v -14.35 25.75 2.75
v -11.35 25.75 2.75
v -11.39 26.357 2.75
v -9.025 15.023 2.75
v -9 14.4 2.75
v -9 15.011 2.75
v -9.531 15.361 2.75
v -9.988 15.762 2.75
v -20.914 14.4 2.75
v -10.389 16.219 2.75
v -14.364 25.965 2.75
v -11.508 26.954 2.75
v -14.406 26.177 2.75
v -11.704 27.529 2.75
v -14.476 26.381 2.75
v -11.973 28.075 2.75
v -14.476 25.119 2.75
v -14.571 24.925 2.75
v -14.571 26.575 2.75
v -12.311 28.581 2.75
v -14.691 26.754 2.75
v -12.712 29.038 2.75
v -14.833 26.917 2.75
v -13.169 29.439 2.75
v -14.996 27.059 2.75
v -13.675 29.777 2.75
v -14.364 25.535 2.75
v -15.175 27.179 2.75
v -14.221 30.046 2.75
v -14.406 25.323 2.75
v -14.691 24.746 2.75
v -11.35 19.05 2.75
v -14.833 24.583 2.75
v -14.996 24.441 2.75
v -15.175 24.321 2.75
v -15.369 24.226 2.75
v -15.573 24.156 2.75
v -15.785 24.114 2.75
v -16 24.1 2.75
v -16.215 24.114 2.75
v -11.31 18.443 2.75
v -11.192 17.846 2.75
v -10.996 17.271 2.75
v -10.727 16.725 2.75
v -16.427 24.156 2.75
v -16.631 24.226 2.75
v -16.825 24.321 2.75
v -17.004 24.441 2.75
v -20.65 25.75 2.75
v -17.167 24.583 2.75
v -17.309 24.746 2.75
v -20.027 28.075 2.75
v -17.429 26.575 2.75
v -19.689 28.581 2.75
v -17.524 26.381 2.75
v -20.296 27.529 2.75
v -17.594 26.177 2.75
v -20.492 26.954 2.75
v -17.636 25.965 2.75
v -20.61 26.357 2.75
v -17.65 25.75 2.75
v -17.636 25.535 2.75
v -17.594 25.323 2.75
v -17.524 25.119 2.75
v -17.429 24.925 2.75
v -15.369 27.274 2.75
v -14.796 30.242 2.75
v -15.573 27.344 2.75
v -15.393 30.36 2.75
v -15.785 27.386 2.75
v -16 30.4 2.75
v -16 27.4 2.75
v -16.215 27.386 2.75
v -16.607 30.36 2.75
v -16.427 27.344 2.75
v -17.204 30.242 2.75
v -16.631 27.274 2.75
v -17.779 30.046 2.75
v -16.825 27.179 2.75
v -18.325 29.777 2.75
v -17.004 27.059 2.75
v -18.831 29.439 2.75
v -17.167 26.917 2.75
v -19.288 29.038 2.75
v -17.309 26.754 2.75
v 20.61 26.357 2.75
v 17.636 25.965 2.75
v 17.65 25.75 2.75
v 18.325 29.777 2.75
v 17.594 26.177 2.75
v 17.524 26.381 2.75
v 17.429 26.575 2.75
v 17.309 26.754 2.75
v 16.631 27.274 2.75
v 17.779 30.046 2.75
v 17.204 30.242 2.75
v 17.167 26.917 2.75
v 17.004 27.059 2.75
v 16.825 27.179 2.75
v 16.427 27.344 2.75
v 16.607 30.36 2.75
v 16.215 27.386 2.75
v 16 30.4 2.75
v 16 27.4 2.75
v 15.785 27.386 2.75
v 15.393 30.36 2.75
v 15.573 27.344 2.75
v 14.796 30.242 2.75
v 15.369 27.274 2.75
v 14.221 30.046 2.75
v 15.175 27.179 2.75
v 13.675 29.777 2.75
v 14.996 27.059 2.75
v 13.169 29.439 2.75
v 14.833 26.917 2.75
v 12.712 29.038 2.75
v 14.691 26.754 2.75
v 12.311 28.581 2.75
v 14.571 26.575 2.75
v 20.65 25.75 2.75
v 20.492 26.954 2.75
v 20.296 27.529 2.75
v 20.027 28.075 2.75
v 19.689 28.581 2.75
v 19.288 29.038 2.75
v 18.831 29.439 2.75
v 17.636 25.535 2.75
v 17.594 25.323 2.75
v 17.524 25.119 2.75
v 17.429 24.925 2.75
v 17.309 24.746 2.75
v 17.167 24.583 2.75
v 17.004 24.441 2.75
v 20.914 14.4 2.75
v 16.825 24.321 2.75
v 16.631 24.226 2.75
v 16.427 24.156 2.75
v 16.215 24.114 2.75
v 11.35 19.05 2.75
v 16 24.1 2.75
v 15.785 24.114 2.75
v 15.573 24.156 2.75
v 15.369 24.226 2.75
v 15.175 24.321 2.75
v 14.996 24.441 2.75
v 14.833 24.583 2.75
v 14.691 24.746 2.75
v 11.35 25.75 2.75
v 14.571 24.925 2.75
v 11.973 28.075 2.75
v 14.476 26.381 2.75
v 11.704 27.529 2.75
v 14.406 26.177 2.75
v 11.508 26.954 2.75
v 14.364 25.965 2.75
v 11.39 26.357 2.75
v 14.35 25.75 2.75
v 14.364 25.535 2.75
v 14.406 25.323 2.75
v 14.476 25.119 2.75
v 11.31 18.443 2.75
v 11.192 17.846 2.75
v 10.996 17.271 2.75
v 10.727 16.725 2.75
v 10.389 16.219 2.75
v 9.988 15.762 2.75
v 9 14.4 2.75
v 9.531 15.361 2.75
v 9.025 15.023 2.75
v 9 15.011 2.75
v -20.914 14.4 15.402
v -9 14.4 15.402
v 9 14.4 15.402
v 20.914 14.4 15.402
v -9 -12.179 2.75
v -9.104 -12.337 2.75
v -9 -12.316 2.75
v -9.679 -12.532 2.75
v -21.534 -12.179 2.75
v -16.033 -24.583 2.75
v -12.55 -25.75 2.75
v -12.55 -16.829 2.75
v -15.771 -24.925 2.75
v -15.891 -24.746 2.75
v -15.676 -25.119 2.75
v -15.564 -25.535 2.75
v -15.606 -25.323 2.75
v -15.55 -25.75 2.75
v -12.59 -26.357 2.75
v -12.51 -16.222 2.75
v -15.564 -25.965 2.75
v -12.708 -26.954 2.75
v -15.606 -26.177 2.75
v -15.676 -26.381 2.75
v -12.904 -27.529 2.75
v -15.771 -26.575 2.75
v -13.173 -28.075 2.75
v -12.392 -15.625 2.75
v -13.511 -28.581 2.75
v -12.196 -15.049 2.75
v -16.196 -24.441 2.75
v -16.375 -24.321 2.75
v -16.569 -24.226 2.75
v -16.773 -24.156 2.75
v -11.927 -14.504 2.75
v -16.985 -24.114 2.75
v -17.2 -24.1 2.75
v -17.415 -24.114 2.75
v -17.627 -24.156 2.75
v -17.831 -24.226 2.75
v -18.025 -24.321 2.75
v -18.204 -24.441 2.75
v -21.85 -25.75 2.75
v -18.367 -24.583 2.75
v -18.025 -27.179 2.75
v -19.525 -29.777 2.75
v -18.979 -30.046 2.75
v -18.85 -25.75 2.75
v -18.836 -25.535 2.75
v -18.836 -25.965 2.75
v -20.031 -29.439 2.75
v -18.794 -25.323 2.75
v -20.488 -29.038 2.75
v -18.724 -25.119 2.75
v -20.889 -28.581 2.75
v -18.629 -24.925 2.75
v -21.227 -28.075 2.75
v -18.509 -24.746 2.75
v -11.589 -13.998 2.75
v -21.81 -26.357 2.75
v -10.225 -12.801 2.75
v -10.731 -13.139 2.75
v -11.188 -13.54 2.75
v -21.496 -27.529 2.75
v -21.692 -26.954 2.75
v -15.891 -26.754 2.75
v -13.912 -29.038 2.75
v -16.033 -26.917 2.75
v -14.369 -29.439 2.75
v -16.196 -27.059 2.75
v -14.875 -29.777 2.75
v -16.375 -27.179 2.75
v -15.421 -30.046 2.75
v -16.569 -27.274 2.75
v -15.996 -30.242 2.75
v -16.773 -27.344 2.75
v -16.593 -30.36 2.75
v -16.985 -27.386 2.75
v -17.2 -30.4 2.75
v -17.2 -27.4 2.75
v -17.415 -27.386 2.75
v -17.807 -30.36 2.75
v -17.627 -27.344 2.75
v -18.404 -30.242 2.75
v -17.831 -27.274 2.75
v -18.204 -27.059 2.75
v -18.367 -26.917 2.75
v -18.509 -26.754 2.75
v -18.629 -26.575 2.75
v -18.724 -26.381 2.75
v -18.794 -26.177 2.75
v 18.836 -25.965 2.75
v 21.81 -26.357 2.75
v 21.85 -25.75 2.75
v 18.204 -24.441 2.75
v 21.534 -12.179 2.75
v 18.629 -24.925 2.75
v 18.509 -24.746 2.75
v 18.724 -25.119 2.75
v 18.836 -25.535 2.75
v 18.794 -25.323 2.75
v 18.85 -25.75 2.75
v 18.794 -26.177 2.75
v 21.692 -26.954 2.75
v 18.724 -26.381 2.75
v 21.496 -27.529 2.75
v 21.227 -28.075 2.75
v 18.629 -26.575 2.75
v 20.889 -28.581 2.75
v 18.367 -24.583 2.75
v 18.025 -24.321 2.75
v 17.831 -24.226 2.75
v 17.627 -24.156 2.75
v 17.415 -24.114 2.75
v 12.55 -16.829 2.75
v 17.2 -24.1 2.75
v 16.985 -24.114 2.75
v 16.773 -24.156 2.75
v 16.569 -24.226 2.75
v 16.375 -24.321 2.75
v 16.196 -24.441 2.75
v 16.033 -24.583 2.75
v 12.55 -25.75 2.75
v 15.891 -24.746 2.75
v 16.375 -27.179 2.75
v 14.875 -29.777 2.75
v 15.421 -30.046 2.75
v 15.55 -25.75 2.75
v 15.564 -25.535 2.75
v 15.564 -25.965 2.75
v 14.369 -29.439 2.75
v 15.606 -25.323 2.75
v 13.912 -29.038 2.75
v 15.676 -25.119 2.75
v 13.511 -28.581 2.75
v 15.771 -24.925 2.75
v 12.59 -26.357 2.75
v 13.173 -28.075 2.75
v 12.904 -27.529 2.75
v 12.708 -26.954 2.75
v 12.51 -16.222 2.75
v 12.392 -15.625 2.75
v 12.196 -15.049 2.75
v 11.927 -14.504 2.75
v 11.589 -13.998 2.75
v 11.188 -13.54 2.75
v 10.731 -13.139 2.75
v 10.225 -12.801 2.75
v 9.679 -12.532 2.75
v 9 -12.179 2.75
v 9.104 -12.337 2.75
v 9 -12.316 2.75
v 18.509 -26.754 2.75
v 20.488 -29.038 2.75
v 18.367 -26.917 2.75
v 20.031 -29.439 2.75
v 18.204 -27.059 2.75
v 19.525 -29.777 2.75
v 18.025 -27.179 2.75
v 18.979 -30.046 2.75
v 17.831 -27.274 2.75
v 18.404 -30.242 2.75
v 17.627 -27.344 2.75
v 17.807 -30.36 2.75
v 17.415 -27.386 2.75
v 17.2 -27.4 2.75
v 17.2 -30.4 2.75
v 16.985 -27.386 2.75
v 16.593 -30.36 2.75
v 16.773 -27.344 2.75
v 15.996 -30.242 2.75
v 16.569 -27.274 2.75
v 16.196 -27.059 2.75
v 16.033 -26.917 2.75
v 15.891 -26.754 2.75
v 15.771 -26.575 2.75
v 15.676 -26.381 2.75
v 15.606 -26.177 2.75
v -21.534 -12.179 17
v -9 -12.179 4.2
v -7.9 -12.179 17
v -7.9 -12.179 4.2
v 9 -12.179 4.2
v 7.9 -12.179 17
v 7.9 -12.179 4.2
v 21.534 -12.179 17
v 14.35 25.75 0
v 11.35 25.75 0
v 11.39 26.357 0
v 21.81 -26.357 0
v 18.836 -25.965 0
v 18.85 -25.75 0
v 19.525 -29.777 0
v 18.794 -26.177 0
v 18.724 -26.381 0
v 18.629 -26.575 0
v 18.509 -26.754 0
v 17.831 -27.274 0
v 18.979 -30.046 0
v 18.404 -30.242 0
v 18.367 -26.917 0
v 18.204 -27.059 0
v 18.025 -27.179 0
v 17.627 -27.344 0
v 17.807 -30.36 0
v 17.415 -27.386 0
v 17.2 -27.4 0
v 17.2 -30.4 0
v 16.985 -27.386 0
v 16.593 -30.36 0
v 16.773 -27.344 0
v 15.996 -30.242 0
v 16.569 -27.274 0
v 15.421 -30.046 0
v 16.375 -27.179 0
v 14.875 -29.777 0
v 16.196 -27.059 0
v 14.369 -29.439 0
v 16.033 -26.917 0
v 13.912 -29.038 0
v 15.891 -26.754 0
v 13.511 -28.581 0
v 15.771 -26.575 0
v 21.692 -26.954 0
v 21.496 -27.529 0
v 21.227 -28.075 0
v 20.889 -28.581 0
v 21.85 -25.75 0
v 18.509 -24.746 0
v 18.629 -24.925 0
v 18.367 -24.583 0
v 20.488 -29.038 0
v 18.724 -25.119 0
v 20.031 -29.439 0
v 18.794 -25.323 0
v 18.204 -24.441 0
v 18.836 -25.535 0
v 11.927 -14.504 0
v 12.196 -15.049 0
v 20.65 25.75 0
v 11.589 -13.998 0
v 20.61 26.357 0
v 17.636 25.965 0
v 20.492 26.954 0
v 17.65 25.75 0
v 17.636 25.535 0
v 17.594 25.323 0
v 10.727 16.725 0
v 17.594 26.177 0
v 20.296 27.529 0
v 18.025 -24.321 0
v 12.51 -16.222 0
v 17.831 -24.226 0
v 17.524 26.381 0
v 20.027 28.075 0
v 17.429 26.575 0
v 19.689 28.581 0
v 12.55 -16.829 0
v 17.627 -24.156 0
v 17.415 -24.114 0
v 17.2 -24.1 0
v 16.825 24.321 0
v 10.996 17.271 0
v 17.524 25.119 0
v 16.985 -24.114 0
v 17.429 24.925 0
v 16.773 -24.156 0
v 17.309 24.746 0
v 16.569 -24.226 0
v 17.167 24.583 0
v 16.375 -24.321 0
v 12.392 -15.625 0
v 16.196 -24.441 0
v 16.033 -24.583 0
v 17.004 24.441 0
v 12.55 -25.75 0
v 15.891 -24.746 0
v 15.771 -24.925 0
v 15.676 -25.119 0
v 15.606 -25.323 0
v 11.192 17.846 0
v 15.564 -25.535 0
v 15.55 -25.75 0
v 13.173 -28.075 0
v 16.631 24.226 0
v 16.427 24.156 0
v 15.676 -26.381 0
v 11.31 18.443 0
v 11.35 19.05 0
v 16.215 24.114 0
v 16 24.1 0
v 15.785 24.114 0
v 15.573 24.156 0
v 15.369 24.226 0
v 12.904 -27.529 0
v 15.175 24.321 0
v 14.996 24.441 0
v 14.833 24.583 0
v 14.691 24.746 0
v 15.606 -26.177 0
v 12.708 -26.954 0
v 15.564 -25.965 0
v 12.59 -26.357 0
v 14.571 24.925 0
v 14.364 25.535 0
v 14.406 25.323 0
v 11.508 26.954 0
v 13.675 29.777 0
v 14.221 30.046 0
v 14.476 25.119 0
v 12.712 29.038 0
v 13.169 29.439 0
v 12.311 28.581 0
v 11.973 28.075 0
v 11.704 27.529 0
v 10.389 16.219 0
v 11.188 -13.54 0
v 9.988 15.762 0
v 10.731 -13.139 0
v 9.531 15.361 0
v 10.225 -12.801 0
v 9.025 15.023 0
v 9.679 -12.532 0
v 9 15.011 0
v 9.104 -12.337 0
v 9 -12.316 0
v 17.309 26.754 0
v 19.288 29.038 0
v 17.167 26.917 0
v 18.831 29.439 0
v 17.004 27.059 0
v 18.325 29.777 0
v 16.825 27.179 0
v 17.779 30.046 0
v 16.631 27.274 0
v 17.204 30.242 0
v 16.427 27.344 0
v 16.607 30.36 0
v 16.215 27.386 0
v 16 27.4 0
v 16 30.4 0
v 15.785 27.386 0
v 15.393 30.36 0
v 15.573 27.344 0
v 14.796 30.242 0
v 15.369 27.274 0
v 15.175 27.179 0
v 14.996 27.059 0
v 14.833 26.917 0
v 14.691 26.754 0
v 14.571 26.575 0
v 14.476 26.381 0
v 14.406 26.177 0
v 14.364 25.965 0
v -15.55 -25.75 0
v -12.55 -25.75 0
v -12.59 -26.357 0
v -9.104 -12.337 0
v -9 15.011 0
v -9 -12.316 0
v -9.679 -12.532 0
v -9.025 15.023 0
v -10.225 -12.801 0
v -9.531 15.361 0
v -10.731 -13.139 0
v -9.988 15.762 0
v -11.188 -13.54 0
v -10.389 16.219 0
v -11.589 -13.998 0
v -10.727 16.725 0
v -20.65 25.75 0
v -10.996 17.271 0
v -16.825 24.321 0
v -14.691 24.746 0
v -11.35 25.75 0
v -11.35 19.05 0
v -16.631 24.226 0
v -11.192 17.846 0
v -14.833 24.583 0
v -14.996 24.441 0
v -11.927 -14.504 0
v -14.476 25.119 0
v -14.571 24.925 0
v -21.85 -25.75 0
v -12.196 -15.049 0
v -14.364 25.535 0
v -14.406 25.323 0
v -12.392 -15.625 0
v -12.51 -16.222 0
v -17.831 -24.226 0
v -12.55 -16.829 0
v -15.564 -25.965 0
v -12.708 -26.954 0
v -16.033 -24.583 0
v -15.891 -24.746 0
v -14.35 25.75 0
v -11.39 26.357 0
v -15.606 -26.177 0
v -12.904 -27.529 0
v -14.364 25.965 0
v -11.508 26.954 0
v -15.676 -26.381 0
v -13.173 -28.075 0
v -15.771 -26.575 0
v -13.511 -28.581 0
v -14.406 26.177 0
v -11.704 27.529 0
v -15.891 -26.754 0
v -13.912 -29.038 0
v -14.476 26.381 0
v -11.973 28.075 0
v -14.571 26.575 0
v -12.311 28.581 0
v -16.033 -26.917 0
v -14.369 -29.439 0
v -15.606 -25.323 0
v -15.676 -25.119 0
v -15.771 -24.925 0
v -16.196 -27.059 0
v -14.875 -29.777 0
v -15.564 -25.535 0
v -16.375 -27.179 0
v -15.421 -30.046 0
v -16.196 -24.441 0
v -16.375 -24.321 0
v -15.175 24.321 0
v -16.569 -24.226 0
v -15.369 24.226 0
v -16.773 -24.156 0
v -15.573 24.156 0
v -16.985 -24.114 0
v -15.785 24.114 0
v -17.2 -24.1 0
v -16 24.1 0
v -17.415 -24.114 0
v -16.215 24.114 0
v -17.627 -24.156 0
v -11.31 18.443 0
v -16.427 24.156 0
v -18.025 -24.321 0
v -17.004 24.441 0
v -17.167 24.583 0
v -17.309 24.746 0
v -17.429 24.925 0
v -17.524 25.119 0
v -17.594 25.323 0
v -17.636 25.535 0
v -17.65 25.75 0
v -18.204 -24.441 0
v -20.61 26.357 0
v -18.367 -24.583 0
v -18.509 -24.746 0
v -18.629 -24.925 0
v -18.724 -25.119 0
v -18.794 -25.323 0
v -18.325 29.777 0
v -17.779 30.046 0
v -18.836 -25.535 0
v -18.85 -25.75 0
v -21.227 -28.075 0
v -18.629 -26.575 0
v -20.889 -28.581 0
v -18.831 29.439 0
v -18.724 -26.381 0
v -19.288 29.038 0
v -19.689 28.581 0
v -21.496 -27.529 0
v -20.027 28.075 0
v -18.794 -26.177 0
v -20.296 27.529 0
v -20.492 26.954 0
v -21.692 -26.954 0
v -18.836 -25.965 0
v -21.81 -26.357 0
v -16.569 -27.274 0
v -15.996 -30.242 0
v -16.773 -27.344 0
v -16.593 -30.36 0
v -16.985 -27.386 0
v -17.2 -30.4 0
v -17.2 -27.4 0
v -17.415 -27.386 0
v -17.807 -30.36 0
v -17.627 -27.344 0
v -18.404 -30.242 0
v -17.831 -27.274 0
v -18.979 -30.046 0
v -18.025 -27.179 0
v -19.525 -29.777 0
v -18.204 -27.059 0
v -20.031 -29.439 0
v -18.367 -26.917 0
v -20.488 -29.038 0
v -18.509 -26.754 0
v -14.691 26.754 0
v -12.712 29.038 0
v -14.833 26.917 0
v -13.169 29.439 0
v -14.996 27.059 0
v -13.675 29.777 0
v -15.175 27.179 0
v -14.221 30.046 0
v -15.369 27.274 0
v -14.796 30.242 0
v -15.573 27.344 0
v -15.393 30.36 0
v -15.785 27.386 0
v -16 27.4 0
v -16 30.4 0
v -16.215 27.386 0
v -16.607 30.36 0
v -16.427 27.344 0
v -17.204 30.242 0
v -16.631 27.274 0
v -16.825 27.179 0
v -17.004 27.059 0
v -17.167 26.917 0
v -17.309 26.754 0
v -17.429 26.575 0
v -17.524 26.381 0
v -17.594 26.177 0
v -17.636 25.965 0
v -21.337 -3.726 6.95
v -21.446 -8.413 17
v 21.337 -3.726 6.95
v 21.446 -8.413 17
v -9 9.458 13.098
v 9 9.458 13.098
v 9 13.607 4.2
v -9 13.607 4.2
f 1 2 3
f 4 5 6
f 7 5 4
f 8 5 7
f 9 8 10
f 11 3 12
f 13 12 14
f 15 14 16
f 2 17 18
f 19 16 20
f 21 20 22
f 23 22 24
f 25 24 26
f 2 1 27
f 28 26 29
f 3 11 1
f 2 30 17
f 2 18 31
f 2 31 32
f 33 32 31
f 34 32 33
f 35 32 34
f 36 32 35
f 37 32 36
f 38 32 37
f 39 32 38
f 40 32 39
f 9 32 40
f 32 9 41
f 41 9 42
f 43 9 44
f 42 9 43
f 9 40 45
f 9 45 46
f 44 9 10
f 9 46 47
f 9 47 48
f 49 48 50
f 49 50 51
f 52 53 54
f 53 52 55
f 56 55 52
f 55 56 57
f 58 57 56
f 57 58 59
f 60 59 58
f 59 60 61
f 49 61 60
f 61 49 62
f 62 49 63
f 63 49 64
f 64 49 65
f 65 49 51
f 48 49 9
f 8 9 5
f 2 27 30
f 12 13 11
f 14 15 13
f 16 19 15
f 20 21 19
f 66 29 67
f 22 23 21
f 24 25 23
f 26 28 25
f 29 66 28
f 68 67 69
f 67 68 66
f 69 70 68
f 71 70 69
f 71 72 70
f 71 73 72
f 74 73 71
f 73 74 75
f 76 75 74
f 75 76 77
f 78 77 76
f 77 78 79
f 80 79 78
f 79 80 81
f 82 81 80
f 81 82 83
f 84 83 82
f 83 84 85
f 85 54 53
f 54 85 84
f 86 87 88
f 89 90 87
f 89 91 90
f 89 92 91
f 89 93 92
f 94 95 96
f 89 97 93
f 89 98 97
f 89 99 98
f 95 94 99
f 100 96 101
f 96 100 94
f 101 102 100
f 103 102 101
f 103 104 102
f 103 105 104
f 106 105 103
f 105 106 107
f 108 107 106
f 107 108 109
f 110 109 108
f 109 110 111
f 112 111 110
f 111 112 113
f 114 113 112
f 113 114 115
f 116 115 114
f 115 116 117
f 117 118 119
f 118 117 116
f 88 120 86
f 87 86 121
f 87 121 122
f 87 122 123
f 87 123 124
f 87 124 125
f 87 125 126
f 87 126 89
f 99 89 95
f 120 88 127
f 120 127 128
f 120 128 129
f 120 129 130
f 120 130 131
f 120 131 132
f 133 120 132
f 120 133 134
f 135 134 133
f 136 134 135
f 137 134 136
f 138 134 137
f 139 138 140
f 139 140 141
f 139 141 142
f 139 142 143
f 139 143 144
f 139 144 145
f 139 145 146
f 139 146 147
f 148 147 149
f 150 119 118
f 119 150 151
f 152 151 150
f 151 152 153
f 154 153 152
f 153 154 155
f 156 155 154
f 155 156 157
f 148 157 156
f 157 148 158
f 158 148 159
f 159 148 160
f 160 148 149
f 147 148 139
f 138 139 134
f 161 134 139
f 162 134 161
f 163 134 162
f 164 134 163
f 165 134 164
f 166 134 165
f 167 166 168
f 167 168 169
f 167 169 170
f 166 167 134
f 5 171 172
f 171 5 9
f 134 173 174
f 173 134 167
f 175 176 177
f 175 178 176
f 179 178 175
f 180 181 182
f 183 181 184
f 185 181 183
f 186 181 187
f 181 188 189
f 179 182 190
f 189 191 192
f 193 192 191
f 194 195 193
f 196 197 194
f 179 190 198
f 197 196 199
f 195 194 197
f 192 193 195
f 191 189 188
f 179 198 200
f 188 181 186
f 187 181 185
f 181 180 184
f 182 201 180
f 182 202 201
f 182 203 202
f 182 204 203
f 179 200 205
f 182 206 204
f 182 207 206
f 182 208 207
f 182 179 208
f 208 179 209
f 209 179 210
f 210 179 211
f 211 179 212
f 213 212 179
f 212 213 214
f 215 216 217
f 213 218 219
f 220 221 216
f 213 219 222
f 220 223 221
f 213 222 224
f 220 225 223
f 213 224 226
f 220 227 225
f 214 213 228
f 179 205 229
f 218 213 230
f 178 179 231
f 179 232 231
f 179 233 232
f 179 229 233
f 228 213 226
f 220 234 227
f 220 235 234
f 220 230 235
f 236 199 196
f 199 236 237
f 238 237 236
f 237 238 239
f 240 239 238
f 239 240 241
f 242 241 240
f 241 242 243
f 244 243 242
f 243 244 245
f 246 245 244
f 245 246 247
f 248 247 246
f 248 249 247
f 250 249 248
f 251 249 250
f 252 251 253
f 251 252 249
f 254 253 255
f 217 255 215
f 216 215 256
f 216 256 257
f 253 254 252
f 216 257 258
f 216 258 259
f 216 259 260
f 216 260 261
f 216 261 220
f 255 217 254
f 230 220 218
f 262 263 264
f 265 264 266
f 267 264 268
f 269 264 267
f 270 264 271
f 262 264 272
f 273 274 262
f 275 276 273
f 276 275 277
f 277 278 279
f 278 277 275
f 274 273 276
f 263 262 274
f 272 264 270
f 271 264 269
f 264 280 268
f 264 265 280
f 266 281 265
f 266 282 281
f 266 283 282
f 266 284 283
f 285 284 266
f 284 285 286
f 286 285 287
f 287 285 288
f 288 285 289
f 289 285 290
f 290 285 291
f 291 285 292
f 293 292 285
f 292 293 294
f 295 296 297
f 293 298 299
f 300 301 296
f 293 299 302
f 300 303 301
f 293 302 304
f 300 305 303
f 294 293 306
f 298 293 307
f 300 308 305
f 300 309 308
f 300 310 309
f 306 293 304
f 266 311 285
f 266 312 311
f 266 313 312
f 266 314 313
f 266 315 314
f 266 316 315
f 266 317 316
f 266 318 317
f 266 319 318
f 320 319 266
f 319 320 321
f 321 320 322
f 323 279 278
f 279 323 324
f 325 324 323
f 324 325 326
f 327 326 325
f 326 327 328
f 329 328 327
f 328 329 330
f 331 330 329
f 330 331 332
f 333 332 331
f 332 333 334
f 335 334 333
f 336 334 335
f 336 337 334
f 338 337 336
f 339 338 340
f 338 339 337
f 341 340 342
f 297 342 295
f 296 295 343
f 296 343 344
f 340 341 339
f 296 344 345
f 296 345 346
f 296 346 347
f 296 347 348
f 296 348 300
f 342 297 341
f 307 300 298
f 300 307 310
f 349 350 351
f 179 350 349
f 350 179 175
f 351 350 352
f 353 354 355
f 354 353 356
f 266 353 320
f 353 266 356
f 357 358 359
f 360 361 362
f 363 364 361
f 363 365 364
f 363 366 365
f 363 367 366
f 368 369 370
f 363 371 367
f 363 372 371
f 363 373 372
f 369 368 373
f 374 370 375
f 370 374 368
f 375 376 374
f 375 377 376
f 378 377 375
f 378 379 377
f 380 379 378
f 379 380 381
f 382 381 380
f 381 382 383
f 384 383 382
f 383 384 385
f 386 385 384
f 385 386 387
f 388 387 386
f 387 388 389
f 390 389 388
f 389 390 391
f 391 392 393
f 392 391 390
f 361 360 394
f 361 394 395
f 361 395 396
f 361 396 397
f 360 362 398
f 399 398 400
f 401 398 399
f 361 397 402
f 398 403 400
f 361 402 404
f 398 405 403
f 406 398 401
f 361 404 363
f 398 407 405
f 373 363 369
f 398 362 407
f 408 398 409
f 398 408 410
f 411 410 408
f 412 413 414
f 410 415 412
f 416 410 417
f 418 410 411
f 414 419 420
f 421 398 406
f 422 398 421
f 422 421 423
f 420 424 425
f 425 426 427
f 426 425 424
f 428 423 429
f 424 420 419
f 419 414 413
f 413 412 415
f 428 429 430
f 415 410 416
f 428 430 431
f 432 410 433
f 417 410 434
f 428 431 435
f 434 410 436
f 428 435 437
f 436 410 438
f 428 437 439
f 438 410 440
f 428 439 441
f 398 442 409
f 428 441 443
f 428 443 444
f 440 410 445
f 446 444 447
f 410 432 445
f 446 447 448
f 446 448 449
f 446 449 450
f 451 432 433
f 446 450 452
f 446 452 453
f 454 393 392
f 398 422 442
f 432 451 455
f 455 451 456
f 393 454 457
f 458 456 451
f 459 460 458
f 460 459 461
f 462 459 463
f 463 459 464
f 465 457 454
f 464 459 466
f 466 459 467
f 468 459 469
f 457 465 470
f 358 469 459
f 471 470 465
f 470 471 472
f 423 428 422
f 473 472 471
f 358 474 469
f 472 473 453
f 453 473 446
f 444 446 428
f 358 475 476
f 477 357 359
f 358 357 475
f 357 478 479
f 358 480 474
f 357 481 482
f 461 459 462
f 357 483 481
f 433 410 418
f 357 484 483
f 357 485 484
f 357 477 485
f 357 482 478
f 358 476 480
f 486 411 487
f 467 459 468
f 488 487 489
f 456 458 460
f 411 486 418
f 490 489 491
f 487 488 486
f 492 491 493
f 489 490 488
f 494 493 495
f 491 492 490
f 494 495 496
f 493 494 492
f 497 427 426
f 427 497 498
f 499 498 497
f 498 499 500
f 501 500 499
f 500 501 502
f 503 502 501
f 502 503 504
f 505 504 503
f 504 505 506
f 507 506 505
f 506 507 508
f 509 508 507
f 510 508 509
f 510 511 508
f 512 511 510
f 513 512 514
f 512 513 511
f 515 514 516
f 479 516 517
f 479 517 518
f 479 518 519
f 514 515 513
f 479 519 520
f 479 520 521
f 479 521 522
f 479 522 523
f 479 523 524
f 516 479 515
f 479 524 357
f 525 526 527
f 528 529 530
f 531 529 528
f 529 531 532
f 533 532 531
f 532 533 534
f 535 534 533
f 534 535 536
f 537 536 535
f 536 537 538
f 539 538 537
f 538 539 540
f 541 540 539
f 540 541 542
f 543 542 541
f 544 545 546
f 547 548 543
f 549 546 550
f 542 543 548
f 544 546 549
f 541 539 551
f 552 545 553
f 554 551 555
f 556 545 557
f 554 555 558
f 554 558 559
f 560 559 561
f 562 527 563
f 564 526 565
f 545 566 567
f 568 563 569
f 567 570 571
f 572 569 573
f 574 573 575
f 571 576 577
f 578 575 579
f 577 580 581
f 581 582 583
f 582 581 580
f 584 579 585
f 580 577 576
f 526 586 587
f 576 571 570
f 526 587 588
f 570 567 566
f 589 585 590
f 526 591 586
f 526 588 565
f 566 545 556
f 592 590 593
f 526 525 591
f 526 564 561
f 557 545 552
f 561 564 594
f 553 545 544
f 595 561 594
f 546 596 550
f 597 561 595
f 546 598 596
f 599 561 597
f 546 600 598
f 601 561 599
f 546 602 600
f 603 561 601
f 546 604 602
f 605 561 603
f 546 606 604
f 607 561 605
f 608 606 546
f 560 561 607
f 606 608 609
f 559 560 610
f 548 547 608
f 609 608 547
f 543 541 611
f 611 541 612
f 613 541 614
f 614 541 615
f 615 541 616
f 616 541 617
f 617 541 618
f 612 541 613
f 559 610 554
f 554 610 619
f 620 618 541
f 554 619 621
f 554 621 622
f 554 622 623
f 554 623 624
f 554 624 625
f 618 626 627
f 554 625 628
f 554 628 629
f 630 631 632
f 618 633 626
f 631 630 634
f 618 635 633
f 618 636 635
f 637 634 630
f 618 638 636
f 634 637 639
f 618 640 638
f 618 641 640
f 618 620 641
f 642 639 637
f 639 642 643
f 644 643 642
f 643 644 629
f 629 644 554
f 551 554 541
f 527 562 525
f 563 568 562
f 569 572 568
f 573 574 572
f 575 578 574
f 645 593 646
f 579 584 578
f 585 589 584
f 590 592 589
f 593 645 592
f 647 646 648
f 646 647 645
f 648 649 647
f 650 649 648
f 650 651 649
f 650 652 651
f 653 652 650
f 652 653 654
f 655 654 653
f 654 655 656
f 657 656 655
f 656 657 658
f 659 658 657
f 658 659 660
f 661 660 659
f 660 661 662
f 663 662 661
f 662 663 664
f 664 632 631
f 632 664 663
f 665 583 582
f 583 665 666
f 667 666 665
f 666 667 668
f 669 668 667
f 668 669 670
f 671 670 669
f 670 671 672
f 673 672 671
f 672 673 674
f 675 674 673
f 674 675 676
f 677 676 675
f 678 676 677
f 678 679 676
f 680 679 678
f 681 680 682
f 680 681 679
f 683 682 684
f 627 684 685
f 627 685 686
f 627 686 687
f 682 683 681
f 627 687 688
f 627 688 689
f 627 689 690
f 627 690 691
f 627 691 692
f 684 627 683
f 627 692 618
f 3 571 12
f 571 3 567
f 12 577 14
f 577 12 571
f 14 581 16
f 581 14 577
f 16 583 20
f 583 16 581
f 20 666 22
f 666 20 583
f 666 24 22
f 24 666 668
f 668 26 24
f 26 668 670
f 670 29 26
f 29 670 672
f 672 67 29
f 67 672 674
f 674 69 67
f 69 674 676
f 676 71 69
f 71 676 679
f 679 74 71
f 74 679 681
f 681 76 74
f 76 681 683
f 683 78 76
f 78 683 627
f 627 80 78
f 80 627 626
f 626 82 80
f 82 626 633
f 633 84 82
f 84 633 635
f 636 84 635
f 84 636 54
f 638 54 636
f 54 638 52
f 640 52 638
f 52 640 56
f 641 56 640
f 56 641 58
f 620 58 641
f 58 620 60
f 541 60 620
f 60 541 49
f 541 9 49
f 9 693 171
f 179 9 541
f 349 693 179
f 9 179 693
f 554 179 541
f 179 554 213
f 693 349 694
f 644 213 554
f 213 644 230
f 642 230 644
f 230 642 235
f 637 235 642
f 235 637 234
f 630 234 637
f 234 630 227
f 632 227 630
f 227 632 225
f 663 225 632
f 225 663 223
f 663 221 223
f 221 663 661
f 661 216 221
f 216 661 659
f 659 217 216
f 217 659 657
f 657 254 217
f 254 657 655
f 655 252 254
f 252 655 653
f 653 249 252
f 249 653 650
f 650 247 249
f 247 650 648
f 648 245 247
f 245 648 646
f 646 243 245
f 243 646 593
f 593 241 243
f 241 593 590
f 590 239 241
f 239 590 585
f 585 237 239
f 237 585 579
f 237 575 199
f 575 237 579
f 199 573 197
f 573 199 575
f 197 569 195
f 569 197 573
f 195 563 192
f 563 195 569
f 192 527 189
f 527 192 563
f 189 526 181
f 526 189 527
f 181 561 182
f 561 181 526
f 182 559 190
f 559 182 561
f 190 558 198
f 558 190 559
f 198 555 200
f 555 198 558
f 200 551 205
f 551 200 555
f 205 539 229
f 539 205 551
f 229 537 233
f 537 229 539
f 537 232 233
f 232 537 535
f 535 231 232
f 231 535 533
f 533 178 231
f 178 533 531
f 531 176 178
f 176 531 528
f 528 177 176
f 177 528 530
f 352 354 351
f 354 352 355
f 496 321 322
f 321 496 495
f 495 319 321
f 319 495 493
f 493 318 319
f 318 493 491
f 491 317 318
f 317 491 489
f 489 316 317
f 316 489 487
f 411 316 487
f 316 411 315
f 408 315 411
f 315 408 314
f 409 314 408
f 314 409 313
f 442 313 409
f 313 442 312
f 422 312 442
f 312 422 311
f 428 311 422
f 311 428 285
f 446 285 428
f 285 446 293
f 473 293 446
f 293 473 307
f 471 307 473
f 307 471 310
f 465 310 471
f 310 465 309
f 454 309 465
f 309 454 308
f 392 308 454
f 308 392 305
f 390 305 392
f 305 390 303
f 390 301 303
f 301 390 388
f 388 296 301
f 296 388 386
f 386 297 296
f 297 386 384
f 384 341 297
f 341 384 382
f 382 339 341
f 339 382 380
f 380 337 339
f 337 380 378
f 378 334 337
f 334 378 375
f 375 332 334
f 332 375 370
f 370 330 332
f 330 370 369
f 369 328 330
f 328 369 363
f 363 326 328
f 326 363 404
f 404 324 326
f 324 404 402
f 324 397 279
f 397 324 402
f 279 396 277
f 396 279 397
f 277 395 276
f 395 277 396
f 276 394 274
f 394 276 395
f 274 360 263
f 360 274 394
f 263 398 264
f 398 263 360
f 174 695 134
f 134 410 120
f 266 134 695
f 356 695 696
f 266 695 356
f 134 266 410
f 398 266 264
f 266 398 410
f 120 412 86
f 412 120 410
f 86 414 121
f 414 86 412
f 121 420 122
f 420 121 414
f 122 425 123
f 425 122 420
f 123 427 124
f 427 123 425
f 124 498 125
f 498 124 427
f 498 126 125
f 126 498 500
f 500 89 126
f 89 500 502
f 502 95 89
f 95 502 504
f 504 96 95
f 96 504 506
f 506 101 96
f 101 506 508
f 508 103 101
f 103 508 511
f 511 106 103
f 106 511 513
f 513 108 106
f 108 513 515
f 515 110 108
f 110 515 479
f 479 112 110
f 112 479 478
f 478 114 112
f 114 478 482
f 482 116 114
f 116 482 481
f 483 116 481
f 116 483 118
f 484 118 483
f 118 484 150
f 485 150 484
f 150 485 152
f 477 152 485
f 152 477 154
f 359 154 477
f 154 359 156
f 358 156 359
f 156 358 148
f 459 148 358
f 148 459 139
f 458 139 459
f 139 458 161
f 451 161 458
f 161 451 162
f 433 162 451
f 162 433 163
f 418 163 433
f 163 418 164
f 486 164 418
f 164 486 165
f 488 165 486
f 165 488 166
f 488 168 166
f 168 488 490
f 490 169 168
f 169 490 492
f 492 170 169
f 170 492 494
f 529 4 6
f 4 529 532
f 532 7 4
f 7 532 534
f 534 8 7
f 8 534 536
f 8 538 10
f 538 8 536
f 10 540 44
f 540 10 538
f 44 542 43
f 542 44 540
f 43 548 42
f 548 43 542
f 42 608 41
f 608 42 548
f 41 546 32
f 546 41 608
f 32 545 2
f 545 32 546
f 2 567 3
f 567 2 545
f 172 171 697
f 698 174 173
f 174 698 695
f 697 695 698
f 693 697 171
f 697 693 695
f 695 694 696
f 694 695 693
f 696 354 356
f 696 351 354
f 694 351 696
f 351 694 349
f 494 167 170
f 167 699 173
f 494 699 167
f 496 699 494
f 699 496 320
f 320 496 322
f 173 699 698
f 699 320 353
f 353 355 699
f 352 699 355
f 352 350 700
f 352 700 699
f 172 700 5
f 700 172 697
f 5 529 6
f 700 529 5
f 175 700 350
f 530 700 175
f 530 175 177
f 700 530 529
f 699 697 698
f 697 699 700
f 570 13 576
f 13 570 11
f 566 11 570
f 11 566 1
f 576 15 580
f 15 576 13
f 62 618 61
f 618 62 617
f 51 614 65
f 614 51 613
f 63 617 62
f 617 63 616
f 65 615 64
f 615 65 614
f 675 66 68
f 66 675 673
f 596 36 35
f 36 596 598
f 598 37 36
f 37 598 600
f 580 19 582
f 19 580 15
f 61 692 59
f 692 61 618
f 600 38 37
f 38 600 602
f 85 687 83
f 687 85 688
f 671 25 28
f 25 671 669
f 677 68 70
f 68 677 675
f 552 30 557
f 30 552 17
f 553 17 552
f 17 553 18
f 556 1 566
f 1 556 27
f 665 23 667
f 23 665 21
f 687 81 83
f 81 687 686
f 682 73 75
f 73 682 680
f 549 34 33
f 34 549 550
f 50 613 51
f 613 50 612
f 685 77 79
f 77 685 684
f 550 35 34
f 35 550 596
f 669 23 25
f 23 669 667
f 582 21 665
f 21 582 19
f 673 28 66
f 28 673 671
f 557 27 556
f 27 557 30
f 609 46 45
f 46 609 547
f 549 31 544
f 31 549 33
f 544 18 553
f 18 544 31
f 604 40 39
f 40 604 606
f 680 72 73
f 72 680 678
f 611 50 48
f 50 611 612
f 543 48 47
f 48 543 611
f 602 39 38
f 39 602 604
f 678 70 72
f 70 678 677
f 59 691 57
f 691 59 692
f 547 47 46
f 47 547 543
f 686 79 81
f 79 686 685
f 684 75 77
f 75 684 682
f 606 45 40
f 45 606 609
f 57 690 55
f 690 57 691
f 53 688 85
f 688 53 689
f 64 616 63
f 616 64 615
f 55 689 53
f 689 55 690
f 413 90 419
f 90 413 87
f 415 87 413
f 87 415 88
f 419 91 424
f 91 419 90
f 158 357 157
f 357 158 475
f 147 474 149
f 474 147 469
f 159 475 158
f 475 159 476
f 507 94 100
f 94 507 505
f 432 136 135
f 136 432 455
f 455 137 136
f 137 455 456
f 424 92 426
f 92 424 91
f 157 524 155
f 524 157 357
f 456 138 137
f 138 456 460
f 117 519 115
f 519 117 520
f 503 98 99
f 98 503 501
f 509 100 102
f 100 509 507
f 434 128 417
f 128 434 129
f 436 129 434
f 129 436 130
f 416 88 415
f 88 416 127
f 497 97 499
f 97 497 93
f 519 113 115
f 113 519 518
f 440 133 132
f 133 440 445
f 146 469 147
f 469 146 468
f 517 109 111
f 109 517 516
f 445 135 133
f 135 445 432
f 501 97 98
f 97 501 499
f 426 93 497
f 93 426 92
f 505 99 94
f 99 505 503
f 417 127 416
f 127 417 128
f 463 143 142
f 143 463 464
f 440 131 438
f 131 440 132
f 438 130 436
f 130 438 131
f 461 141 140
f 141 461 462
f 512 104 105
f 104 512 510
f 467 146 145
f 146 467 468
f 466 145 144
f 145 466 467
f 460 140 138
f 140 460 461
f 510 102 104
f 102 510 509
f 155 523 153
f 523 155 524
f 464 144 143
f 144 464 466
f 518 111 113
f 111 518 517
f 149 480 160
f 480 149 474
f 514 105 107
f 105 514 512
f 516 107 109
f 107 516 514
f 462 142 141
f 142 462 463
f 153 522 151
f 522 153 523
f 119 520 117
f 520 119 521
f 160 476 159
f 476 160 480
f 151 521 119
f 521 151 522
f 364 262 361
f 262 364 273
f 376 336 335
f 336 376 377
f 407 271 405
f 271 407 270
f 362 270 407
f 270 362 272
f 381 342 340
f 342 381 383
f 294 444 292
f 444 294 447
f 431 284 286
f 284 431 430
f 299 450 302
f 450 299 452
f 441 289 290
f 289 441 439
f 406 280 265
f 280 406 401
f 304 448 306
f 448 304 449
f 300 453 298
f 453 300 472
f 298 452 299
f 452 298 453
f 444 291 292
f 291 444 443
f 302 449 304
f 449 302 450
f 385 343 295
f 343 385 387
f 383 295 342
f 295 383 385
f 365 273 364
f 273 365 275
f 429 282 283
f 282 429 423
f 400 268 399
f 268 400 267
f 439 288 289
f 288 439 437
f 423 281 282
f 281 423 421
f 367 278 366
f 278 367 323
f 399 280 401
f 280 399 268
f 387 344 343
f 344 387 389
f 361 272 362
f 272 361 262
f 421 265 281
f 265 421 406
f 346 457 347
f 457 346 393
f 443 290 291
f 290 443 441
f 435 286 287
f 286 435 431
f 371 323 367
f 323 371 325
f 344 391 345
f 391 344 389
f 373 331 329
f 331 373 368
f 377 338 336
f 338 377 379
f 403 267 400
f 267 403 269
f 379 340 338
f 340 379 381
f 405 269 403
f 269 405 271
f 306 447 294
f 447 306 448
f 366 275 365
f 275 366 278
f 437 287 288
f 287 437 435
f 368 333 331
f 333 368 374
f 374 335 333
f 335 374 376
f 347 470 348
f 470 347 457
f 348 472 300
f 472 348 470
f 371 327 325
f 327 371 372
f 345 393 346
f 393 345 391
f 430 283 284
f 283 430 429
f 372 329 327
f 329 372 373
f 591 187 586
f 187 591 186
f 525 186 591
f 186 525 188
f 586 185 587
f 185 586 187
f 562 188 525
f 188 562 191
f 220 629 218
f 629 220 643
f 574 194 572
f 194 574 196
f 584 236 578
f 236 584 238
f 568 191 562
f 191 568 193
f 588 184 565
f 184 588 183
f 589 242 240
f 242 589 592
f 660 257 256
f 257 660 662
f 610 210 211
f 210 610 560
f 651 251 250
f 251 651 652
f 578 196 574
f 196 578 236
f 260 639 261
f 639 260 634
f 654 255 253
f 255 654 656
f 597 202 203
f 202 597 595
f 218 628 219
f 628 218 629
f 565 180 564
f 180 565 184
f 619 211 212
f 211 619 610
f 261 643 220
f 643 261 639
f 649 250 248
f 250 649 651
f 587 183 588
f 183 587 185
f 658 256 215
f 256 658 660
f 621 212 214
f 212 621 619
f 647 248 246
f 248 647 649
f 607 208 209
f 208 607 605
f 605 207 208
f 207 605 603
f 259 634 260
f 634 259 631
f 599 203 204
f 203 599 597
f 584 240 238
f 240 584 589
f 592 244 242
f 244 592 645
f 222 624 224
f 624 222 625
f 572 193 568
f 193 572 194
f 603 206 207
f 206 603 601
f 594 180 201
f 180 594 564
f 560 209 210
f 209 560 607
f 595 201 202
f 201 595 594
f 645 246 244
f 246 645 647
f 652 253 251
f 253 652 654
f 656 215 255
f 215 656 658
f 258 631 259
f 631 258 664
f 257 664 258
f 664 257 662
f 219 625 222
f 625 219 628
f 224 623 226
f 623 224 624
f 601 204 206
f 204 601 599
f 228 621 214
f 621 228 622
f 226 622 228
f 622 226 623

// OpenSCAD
//Depth of camera
camera_depth = 20;
//Height of the supporting back
back_height = 20;
//C/C Distance between front holes
front_cc = 32;
//C/C Distance between rear holes
rear_cc = 34.4;
//C/C Distance between front and rear holes
front_rear_cc = 51.5;
//angle of camera
angle = 25; //[10:45]
//Thickness of the base
base_thickness = 2.75;
//Hole diameter (may need adjustment depending on printer)
hole_size = 3.3;
//Determines the amount of "meat" around the holes
edge_margin = 3;
//Diameter of screw head (to allow enough clerance)
screw_head_size = 6.1;
//Wedge offset from front
front_offset = 16;
//Add lip to fron of wedge
use_lip = "No"; //[Yes,No]
//Velcro strap width
velcro_width = 18;
//Velcro strap thickness
velcro_thickness = 4.2;
//antenna holder angle
angle2 = 85;
antDist = 7;


//Calculated variables wont be visible to Thingiverse customizer
hole_clearence = edge_margin+hole_size/2;
screw_head_clerance = screw_head_size / 2;
hole_radius = hole_size / 2;
lip_thickness = use_lip == "Yes" ? 5*1 : 0*1;
lip_height =  use_lip == "Yes" ? 5*1 : 0*1;

//internal global varaibles
_xFrontOffset = front_cc/2;
_xRearOffset = rear_cc/2;
_xTotFrontOffset = front_cc/2+hole_clearence;
_xTotRearOffset = rear_cc/2+hole_clearence;
_yOffset = front_rear_cc/2;
_yTotOffset = front_rear_cc/2+hole_clearence;
_cameraHolderDepth = (lip_thickness+camera_depth)*cos(angle)+back_height*sin(angle)+lip_thickness;
_cameraHolderHeight = back_height*cos(angle) + base_thickness + velcro_thickness;
_wedgeStartYoffset = _yTotOffset - front_offset;
_wedgeEndYoffset = _yTotOffset - front_offset - _cameraHolderDepth;
_rearSpaceLeft = _yTotOffset * 2 - front_offset - _cameraHolderDepth;
_totWidth = front_cc > rear_cc ? front_cc + hole_clearence*2 : rear_cc + hole_clearence*2;
_velcroXpos = (velcro_width + edge_margin) < (front_cc+2*edge_margin+hole_size) / 2 ? 0 :  ((front_cc+2*edge_margin+hole_size) / 2 )-(velcro_width + edge_margin);


/**
 *
 */
module tube(inDia, outDia, height) {
	difference(){
		cylinder(h = height, r = outDia/2, $fn=50);
		translate([0, 0, -0.5]) { cylinder(h = height+1, r = inDia/2, $fn=30); }
	}
}

module createBase()
{   
           
    difference()
    {
        linear_extrude( height = _cameraHolderHeight)
        {
            union()
            {
                if( front_offset > 0 )
                {
                    polygon(
                                points = [  [-_xTotFrontOffset, _yOffset],
                                            [-_xFrontOffset+hole_clearence, _yOffset],
                                            [-_xFrontOffset+hole_clearence, _wedgeStartYoffset],
                                            [_xFrontOffset-hole_clearence, _wedgeStartYoffset],
                                            [_xFrontOffset-hole_clearence, _yOffset],
                                            [_xTotFrontOffset, _yOffset], 
                                            [_xTotRearOffset, -_yOffset], 
                                            [_xRearOffset-hole_clearence, -_yOffset], 
                                            [_xRearOffset-hole_clearence, _wedgeEndYoffset], 
                                            [-_xRearOffset+hole_clearence, _wedgeEndYoffset], 
                                            [-_xRearOffset+hole_clearence, -_yOffset], 
                                            [-_xTotRearOffset, -_yOffset] ], 
                                convexity = 10);
                } else {
                    polygon(
                                points = [  [-_xFrontOffset, _yOffset+hole_clearence],                                        [_xFrontOffset, _yOffset+hole_clearence], 
                                            [_xTotFrontOffset, _yOffset], 
                                            [_xTotRearOffset, -_yOffset], 
                                            [_xRearOffset-hole_clearence, -_yOffset], 
                                            [_xRearOffset-hole_clearence, _wedgeEndYoffset], 
                                            [-_xRearOffset+hole_clearence, _wedgeEndYoffset], 
                                            [-_xRearOffset+hole_clearence, -_yOffset], 
                                            [-_xTotRearOffset, -_yOffset],
                                            [-_xTotFrontOffset, _yOffset]],
                                convexity = 10);
                }
                translate([-_xFrontOffset, _yOffset, 0])
                circle(r=hole_clearence, center = false); 
                translate([_xFrontOffset, _yOffset, 0])
                circle(r=hole_clearence, center = false); 
                translate([_xRearOffset, -_yOffset, 0])
                circle(r=hole_clearence, center = false); 
                translate([-_xRearOffset, -_yOffset, 0])
                circle(r=hole_clearence, center = false); 
                if(front_offset > hole_clearence*2)
                {
                    difference()
                    {
                        union()
                        {
                            translate([_xFrontOffset-hole_clearence*2, _wedgeStartYoffset, 0])
                            square([hole_clearence,hole_clearence]);
                            translate([-_xFrontOffset+hole_clearence, _wedgeStartYoffset, 0])
                            square([hole_clearence,hole_clearence]);
                        }
                        union()
                        {
                            translate([_xFrontOffset-hole_clearence*2, _wedgeStartYoffset+hole_clearence, 0])
                            circle(r=hole_clearence, center = false); 
                            translate([-_xFrontOffset+hole_clearence*2, _wedgeStartYoffset+hole_clearence, 0])                circle(r=hole_clearence, center = false);   
                        }
                    }
                }
                if((_yTotOffset + _wedgeEndYoffset) > hole_clearence*2)
                {
                    difference()
                    {
                        union()
                        {
                            translate([_xRearOffset-hole_clearence*2, _wedgeEndYoffset-hole_clearence, 0])
                            square([hole_clearence,hole_clearence]);
                            translate([-_xRearOffset+hole_clearence, _wedgeEndYoffset-hole_clearence, 0])
                            square([hole_clearence,hole_clearence]);
                            
                        }
                        union()
                        {
                            translate([_xRearOffset-hole_clearence*2, _wedgeEndYoffset-hole_clearence, 0])
                            circle(r=hole_clearence, center = false); 
                            translate([-_xRearOffset+hole_clearence*2, _wedgeEndYoffset-hole_clearence, 0])
                            circle(r=hole_clearence, center = false); 
                        }
                    }
                }
            }
        }
        union()
        {
            translate([-_totWidth/2, _wedgeStartYoffset, base_thickness])
            cube([_totWidth,front_rear_cc,_cameraHolderHeight], center = false);
            rearSpace = _yTotOffset + _wedgeEndYoffset;
            translate([-_totWidth/2, _wedgeEndYoffset-rearSpace, base_thickness])
            cube([_totWidth,rearSpace,_cameraHolderHeight], center = false);
        }
    }    
}

module addWedge()
{
    totWidth = front_cc > rear_cc ? front_cc + edge_margin*2+hole_size: rear_cc + edge_margin*2+hole_size;
                xOffset = totWidth/2;  
    difference()
    {
        difference()
        {
            children();
            union()
            {
                          
                yOffset = (front_rear_cc/2+edge_margin+hole_size/2)-(lip_thickness+camera_depth)*cos(angle) -front_offset;
                translate([-xOffset, yOffset, base_thickness+velcro_thickness])
                rotate([angle,0,0])
                cube([totWidth, camera_depth, back_height+5], center = false);
                
                
        }
       union()
       {
           yOffset = (front_rear_cc/2+edge_margin+hole_size/2)-lip_thickness*cos(angle) -front_offset; 
                zOffset = base_thickness+velcro_thickness + camera_depth*sin(angle);
                translate([-xOffset, yOffset, zOffset])
                rotate([angle,0,0])
                translate([0, -1, lip_height])
                cube([totWidth, front_rear_cc, back_height+5], center = false);
                translate([-xOffset, yOffset, zOffset])
                rotate([angle,0,0])
                translate([0, lip_thickness, 0])
                cube([totWidth, front_rear_cc, back_height+5], center = false);
           
       } 
    }
    
        translate([0,0,10+17]) cube([50, 50, 20], center = true);
    }
    
    
}

module addStrapHole()
{
    difference()
    {
        children();
        union()
        {
            /****
            yOffset = (front_rear_cc/2+edge_margin+hole_size/2)-lip_thickness*cos(angle) -front_offset; 
            zOffset = base_thickness+velcro_thickness + camera_depth*sin(angle);
            translate([0, yOffset, zOffset])
            rotate([angle,0,0])
            translate([_velcroXpos, 0, -zOffset+base_thickness])
            cube([velcro_width, lip_thickness+1, zOffset*2], center = false);
            ySize = camera_depth + base_thickness + velcro_thickness;
            translate([0, yOffset, zOffset])
            rotate([angle,0,0])            
            translate([_velcroXpos, -ySize, -base_thickness-velcro_thickness])
            cube([velcro_width, ySize+1, velcro_thickness], center = false);
            translate([0, yOffset, zOffset])
            rotate([angle,0,0])            
            translate([_velcroXpos, -ySize, -base_thickness-velcro_thickness])            
            cube([velcro_width, velcro_thickness, back_height*1.5], center = false);
            ****/
            
            /***
            translate([0,6,base_thickness+velcro_thickness]){ 
                rotate([angle,0,0]){
                    cube([_totWidth, velcro_width, velcro_thickness], center = true);
                }
            }
            ***/
            
            translate([0,0,velcro_thickness/2]){ 
                    cube([velcro_width,_totWidth, velcro_thickness], center = true);
            }
            
            translate([0,_wedgeStartYoffset+4.2,0]){
                rotate([angle,0,0]) cube([velcro_width,5.5, 40], center = true);
            }
        }
    }
}

module clearForScrews()
{
    xOffsetFront = front_cc/2;
    xOffsetRear = rear_cc/2;
    yOffset = front_rear_cc/2;
    
    difference()
    {
        children();
        union()
        {
            //Screw holes
            translate([-xOffsetFront, yOffset, (base_thickness+1)/2])
            cylinder(h=base_thickness+1, r=hole_radius, center = true); 
            translate([xOffsetFront, yOffset, (base_thickness+1)/2])
            cylinder(h=base_thickness+1, r=hole_radius, center = true); 
            translate([xOffsetRear, -yOffset, (base_thickness+1)/2])
            cylinder(h=base_thickness+1, r=hole_radius, center = true); 
            translate([-xOffsetRear, -yOffset, (base_thickness+1)/2])
            cylinder(h=base_thickness+1, r=hole_radius, center = true); 
            translate([xOffsetRear, -yOffset, 50+base_thickness])
            cylinder(h=100, r=screw_head_clerance, center = true);        translate([-xOffsetRear, -yOffset, 50+base_thickness])
            cylinder(h=100, r=screw_head_clerance, center = true);
            translate([-xOffsetFront, yOffset, 50+base_thickness])
            cylinder(h=100, r=screw_head_clerance, center = true);
            translate([xOffsetFront, yOffset, 50+base_thickness])
            cylinder(h=100, r=screw_head_clerance, center = true);
            /***
            for(i=[-1,1]){
            translate([i*antDist/2,-front_rear_cc/2-1,0]) rotate([0,i*angle2/2,0]) cylinder(r=hole_size/2, h=90, $fn=20,center=true);
}
            ***/
        }
    }
}


$fn = 48;
clearForScrews()
{
    addStrapHole()
    {
        addWedge()
        {
            createBase();
        }
    }
}

/**
//antenna holder
difference(){

for(i=[-1,1]){
translate([i*antDist/2,-front_rear_cc/2-1,0]) rotate([0,i*angle2/2,0]) tube(hole_size, 7.5, 15);
}

translate([0,0,-10/2]) cube(size=[100,100,10], center=true);
for(i=[-1,1]){
translate([i*antDist/2, -front_rear_cc/2-1,10/2+8]) cube(size=[27,10,10], center=true);
}

}//diff
**/
